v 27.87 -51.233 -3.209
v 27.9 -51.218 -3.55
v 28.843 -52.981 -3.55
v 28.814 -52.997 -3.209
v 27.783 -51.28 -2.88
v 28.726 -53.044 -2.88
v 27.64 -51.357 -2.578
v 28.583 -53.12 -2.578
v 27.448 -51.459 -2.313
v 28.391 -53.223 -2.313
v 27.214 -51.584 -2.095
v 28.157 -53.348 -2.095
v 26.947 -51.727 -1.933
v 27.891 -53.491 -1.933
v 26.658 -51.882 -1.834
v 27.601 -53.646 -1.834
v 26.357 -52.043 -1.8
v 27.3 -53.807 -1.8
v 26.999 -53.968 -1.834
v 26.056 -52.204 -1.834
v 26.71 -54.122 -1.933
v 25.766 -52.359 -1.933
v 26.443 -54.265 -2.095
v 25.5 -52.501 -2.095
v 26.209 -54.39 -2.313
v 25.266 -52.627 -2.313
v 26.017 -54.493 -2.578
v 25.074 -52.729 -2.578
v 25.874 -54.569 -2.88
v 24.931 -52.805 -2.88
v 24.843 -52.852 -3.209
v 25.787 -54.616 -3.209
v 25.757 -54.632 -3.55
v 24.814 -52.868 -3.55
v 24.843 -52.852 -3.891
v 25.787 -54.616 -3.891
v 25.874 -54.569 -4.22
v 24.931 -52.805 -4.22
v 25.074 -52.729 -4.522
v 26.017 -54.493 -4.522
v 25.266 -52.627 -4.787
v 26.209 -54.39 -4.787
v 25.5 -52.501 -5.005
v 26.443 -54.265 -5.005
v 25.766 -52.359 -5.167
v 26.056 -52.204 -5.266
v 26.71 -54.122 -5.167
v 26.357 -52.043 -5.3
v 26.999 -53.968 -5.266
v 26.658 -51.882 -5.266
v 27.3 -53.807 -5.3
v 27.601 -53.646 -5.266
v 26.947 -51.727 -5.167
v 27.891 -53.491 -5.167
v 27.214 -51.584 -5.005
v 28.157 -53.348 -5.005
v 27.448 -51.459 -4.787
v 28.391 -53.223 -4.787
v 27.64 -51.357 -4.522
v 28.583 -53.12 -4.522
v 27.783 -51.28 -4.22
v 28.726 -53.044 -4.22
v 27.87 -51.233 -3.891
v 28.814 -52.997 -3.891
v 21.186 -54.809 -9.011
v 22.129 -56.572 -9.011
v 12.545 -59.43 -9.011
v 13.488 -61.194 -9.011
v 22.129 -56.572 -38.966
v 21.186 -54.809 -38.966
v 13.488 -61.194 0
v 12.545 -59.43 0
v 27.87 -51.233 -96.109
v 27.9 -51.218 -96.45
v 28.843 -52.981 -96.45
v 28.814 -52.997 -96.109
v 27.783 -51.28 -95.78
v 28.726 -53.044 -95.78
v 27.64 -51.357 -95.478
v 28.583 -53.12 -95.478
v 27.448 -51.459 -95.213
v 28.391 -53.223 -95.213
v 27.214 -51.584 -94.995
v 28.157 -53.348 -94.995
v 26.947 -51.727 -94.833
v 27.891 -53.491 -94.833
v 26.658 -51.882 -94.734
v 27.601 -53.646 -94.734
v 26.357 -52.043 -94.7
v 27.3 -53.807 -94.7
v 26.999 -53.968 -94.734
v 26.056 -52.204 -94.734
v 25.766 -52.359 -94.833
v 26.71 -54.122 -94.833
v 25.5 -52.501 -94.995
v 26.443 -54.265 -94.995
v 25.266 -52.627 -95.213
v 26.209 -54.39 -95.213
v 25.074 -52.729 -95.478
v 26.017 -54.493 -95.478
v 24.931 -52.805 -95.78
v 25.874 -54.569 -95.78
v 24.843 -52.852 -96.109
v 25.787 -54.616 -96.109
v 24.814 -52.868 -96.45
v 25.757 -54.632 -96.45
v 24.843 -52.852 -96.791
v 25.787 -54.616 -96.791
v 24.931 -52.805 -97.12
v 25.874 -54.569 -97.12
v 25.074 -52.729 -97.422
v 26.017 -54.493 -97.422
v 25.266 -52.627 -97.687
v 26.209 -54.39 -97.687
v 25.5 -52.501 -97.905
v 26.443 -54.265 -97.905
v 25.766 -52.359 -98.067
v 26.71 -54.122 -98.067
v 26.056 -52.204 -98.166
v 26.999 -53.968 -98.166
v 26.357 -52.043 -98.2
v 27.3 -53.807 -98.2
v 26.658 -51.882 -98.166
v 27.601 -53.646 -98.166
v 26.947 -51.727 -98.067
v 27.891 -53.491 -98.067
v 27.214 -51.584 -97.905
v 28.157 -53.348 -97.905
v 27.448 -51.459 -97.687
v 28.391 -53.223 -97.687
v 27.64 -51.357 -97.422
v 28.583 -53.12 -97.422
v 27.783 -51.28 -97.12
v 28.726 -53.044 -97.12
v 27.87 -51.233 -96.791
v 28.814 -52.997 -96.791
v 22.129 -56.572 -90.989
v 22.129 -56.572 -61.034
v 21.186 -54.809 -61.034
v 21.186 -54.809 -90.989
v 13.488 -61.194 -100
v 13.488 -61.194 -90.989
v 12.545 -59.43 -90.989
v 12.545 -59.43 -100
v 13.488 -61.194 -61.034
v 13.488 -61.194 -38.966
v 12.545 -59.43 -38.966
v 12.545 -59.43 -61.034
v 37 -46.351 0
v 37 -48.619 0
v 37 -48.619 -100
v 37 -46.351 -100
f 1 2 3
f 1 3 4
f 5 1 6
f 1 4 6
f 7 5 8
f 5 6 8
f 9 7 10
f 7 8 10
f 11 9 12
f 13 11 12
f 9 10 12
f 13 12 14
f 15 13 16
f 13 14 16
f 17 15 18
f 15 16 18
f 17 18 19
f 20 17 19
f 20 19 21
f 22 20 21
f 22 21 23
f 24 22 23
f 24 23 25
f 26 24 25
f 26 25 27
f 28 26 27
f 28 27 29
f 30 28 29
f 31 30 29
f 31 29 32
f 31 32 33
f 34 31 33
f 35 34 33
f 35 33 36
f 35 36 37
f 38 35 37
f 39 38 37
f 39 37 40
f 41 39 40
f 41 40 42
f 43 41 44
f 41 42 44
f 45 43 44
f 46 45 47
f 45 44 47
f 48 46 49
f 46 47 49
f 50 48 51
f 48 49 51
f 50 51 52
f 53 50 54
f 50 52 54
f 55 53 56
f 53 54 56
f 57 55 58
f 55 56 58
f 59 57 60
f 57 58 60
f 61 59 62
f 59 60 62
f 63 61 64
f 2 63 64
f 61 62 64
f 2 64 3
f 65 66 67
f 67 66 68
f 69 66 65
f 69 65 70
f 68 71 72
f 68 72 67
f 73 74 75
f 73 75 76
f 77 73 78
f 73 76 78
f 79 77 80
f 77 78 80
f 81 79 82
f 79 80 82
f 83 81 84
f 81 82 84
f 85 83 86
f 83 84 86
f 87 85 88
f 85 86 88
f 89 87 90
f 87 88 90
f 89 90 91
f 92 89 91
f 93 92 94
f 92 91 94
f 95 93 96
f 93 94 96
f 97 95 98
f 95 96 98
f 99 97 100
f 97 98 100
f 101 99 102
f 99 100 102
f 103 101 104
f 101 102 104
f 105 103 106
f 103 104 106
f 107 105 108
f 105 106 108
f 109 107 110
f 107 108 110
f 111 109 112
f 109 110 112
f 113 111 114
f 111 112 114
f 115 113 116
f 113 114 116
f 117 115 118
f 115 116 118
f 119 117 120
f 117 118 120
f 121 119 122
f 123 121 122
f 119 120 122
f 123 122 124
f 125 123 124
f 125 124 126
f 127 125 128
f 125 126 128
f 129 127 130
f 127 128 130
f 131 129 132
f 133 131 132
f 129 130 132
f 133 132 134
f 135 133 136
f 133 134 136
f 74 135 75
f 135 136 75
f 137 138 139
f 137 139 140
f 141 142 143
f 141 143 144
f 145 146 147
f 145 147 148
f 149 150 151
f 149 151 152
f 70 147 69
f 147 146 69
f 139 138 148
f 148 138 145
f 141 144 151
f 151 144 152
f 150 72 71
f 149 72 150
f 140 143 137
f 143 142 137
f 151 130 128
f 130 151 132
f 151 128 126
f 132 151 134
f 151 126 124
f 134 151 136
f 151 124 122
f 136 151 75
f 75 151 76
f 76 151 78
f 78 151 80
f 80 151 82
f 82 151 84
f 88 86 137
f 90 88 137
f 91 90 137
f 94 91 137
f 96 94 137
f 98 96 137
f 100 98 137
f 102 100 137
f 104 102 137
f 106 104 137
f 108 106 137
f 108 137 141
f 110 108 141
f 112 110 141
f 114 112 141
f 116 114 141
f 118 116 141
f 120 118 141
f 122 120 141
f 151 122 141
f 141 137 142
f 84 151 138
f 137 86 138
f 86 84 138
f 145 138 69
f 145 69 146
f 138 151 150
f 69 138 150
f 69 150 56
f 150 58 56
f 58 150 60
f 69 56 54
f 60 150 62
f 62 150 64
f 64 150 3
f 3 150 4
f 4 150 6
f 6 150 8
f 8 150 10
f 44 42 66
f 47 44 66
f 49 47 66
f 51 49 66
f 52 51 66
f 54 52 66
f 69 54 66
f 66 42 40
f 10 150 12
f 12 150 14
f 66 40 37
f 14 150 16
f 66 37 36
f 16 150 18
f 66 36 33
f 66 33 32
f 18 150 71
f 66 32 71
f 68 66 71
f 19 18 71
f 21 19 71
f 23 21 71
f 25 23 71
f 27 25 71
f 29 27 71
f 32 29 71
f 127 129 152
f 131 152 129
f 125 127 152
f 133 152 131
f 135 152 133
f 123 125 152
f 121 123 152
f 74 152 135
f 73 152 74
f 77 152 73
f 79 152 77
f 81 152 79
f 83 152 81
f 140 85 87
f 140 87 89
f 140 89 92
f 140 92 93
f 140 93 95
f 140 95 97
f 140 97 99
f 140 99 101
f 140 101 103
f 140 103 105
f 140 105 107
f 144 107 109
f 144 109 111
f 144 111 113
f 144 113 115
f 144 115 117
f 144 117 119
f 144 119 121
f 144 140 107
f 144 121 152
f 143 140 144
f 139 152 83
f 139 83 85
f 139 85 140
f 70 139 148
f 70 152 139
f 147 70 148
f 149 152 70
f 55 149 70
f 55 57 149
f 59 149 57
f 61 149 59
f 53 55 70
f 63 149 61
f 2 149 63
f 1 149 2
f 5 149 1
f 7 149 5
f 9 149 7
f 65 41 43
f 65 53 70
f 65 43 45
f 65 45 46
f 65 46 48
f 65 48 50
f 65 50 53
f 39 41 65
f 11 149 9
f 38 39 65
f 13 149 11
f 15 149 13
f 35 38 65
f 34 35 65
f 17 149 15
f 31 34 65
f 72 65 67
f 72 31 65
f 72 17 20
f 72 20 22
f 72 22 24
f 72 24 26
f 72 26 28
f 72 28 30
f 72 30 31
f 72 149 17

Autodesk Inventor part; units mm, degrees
ref_plane "YZ Plane" through (0, 0, 0) normal (1, 0, 0) x (0, 1, 0)
ref_plane "XZ Plane" through (0, 0, 0) normal (0, 1, 0) x (-1, 0, 0)
ref_plane "XY Plane" through (0, 0, 0) normal (0, 0, 1) x (1, 0, 0)
sketch "Szkic1" plane through (0, 0, 0) normal (0, 0, 1) x (1, 0, 0)
  line L0 (0, 0) -> (0, -66.5) projected
  line L1 (0, -66.5) -> (2, -66.5) projected
  line L2 (2, 0) -> (2, -66.5) projected
  line L3 (0, 0) -> (2, 0) projected
  circle A0 centre (7, 15.8) radius 1.5 projected
  circle A1 centre (7, 15.8) radius 15.02 projected
  line L4 (7, 30.82) -> (7, 14.3)
  line L5 (7, -69.18) -> (-7.0129, -69.18)
  line L6 (37, -46.3508) -> (4.3309, -63.8229) projected
  line L7 (37, -48.6189) -> (3.5105, -66.5297) projected
  line L8 (37, -48.6189) -> (37, -46.3508)
  line L9 (37, -48.6189) -> (-1.4451, -69.18)
  line L10 (37, -46.3508) -> (-1.4451, -66.9119)
  line L11 (-1.4451, -66.9119) -> (-1.4451, -69.18)
  dimension "d0" = 100
extrude "Wyciągnięcie proste1" add sketch "Szkic1" against normal blind 100 contours L10 L2 L1 L0 | L0 L1 L2 L10 L6 L8 L7 L9 L11
sketch "Szkic5" plane through (-1.4451, -69.18, -100) normal (0.4716076, -0.8818085, 0) x (0.8818085, 0.4716076, 0)
  line L0 (17.9345, 9.0111) -> (17.7164, 38.6148) projected
  line L1 (17.7164, 38.6148) -> (26.2335, 38.9662) projected
  line L2 (26.4517, 9.3625) -> (17.9345, 9.0111) projected
  line L3 (26.2335, 38.9662) -> (17.9345, 38.9662)
  line L4 (17.9345, 38.9662) -> (17.9345, 9.0111)
  line L5 (17.9345, 9.0111) -> (26.2335, 9.0111)
  line L6 (26.2335, 9.0111) -> (26.2335, 38.9662)
  line L7 (17.4345, 39.4662) -> (26.7335, 39.4662)
  line L8 (26.7335, 39.4662) -> (26.7335, 8.5111)
  line L9 (26.7335, 8.5111) -> (17.4345, 8.5111)
  line L10 (17.4345, 8.5111) -> (17.4345, 39.4662)
  line L11 (17.4345, 39.4662) -> (16.9345, 39.4662)
  line L12 (16.9345, 39.4662) -> (16.9345, 8.5111)
  line L13 (16.9345, 8.5111) -> (17.4345, 8.5111)
  line L14 (17.4345, 8.5111) -> (17.4345, 39.4662)
  line L15 (26.7335, 38.9662) -> (16.9345, 38.9662)
  line L16 (16.9345, 38.9662) -> (16.9345, 9.0111)
  line L17 (16.9345, 9.0111) -> (26.7335, 9.0111)
  line L18 (26.7335, 9.0111) -> (26.7335, 38.9662)
  point P0 (33.9001, 100)
  point P1 (17.9345, 9.0111)
  point P2 (26.7335, 9.0111)
  point P3 (17.9345, 38.9662)
  dimension "d7" = 0.5
  dimension "d8" = 0.5
extrude "Wyciągnięcie proste4" cut sketch "Szkic5" against normal through all contours L17 L10 L15 L4 L1 L0 | L4 L1 L6 L2 | L0 L1 L4 | L2 L6 L5 | L6 L15 L8 L17 | L4 L3 L1 | L17 L12 L15 L10
ref_plane "Płaszczyzna konstrukcyjna1" through (0, 0, -50) normal (0, 0, 1) x (1, 0, 0)
mirror "Odbij1" about plane through (0, 0, -50) normal (0, 0, 1) of "Wyciągnięcie proste4"
sketch "Szkic6" plane through (-1.4451, -69.18, -100) normal (0.4716076, -0.8818085, 0) x (0.8818085, 0.4716076, 0)
  line L0 (0, 100) -> (1.0696, 100) projected
  line L1 (0, 100) -> (0, 0) projected
  line L2 (1.0696, 0) -> (0, 0) projected
  line L3 (1.0696, 0) -> (44.6676, 0) projected
  line L4 (0, 100) -> (16.9345, 100)
  line L5 (16.9345, 100) -> (16.9345, 0)
  line L6 (16.9345, 0) -> (0, 0)
  line L7 (0, 0) -> (0, 100)
  line L8 (0, 0) -> (1.0696, 0) projected
  line L9 (0, 0) -> (-9.525, 0)
  line L10 (-9.525, 0) -> (-9.525, 100)
  line L11 (-9.525, 100) -> (0, 100)
  line L12 (0, 100) -> (0, 0)
  line L13 (1.0696, 0) -> (1.0696, 100) projected
  point P0 (33.9001, 100)
  point P1 (43.598, 0)
  point P2 (16.9345, 0)
  point P3 (0, 100)
  point P4 (16.9345, 61.0338)
  point P5 (16.9345, 90.9889)
  point P6 (16.9345, 9.0111)
  point P7 (16.9345, 38.9662)
extrude "Wyciągnięcie proste5" cut sketch "Szkic6" against normal through all
sketch "Szkic7" plane through (37, -48.6189, -100) normal (0.4716076, -0.8818085, 0) x (0.8818085, 0.4716076, 0)
  line L0 (-26.6634, 90.9889) -> (-16.8645, 90.9889) projected
  line L1 (-16.8645, 90.9889) -> (-16.8645, 61.0338) projected
  line L2 (-16.8645, 61.0338) -> (-26.6634, 61.0338) projected
  line L3 (-26.6634, 38.9662) -> (-16.8645, 38.9662) projected
  line L4 (-16.8645, 38.9662) -> (-16.8645, 9.0111) projected
  line L5 (-16.8645, 9.0111) -> (-26.6634, 9.0111) projected
  line L6 (0, 0) -> (-26.6634, 0) projected
  line L7 (0, 100) -> (0, 0) projected
  line L8 (-26.6634, 100) -> (0, 100) projected
  line L9 (-26.6634, 90.9889) -> (-26.6634, 100) projected
  line L10 (0, 100) -> (-26.6634, 100)
  line L11 (-26.6634, 100) -> (-26.6634, 92.9)
  line L12 (-26.6634, 92.9) -> (0, 92.9)
  line L13 (0, 92.9) -> (0, 100)
  line L14 (-16.8645, 90.9889) -> (-16.8645, 100)
  line L15 (1.0696, 100) -> (-42.5283, 100) projected
  circle A0 centre (-11, 96.45) radius 1.75
  line L16 (-52.6978, 50) -> (11.0012, 50) projected
  circle A1 centre (-11, 3.55) radius 1.75
  line L17 (-26.6634, 100) -> (-26.6634, 90.9889) projected
  line L18 (-26.6634, 61.0338) -> (-26.6634, 38.9662) projected
  line L19 (-26.6634, 9.0111) -> (-26.6634, 0) projected
  point P0 (-9.6979, 100)
  point P1 (0, 96.45)
  dimension "d13" = 7.1
  dimension "d15" = 11
  dimension "d16" = 3.55
  dimension "d17" = 3.5
extrude "Wyciągnięcie proste6" cut sketch "Szkic7" against normal through all contours A0 | A1
sketch "Szkic8" plane through (37, -46.3508, 0) normal (-0.4716076, 0.8818085, 0) x (0.8818085, 0.4716076, 0)
  circle A0 centre (-12.0696, 96.45) radius 1.75 projected
  circle A1 centre (-12.0696, 3.55) radius 1.75 projected
  line L0 (-27.7331, 9.0111) -> (-27.7331, 0) projected
  line L1 (0, 0) -> (-27.7331, 0) projected
  line L2 (0, 0) -> (0, 100) projected
  line L3 (-27.7331, 100) -> (0, 100) projected
  line L4 (-27.7331, 100) -> (-27.7331, 90.9889) projected
  line L5 (-27.7331, 90.9889) -> (-17.9341, 90.9889) projected
  line L6 (-17.9341, 90.9889) -> (-17.9341, 61.0338) projected
  line L7 (-17.9341, 61.0338) -> (-27.7331, 61.0338) projected
  line L8 (-27.7331, 61.0338) -> (-27.7331, 38.9662) projected
  line L9 (-27.7331, 38.9662) -> (-17.9341, 38.9662) projected
  line L10 (-17.9341, 38.9662) -> (-17.9341, 9.0111) projected
  line L11 (-17.9341, 9.0111) -> (-27.7331, 9.0111) projected
  point P0 (-10.7675, 0)
properties part number "plug_2"
